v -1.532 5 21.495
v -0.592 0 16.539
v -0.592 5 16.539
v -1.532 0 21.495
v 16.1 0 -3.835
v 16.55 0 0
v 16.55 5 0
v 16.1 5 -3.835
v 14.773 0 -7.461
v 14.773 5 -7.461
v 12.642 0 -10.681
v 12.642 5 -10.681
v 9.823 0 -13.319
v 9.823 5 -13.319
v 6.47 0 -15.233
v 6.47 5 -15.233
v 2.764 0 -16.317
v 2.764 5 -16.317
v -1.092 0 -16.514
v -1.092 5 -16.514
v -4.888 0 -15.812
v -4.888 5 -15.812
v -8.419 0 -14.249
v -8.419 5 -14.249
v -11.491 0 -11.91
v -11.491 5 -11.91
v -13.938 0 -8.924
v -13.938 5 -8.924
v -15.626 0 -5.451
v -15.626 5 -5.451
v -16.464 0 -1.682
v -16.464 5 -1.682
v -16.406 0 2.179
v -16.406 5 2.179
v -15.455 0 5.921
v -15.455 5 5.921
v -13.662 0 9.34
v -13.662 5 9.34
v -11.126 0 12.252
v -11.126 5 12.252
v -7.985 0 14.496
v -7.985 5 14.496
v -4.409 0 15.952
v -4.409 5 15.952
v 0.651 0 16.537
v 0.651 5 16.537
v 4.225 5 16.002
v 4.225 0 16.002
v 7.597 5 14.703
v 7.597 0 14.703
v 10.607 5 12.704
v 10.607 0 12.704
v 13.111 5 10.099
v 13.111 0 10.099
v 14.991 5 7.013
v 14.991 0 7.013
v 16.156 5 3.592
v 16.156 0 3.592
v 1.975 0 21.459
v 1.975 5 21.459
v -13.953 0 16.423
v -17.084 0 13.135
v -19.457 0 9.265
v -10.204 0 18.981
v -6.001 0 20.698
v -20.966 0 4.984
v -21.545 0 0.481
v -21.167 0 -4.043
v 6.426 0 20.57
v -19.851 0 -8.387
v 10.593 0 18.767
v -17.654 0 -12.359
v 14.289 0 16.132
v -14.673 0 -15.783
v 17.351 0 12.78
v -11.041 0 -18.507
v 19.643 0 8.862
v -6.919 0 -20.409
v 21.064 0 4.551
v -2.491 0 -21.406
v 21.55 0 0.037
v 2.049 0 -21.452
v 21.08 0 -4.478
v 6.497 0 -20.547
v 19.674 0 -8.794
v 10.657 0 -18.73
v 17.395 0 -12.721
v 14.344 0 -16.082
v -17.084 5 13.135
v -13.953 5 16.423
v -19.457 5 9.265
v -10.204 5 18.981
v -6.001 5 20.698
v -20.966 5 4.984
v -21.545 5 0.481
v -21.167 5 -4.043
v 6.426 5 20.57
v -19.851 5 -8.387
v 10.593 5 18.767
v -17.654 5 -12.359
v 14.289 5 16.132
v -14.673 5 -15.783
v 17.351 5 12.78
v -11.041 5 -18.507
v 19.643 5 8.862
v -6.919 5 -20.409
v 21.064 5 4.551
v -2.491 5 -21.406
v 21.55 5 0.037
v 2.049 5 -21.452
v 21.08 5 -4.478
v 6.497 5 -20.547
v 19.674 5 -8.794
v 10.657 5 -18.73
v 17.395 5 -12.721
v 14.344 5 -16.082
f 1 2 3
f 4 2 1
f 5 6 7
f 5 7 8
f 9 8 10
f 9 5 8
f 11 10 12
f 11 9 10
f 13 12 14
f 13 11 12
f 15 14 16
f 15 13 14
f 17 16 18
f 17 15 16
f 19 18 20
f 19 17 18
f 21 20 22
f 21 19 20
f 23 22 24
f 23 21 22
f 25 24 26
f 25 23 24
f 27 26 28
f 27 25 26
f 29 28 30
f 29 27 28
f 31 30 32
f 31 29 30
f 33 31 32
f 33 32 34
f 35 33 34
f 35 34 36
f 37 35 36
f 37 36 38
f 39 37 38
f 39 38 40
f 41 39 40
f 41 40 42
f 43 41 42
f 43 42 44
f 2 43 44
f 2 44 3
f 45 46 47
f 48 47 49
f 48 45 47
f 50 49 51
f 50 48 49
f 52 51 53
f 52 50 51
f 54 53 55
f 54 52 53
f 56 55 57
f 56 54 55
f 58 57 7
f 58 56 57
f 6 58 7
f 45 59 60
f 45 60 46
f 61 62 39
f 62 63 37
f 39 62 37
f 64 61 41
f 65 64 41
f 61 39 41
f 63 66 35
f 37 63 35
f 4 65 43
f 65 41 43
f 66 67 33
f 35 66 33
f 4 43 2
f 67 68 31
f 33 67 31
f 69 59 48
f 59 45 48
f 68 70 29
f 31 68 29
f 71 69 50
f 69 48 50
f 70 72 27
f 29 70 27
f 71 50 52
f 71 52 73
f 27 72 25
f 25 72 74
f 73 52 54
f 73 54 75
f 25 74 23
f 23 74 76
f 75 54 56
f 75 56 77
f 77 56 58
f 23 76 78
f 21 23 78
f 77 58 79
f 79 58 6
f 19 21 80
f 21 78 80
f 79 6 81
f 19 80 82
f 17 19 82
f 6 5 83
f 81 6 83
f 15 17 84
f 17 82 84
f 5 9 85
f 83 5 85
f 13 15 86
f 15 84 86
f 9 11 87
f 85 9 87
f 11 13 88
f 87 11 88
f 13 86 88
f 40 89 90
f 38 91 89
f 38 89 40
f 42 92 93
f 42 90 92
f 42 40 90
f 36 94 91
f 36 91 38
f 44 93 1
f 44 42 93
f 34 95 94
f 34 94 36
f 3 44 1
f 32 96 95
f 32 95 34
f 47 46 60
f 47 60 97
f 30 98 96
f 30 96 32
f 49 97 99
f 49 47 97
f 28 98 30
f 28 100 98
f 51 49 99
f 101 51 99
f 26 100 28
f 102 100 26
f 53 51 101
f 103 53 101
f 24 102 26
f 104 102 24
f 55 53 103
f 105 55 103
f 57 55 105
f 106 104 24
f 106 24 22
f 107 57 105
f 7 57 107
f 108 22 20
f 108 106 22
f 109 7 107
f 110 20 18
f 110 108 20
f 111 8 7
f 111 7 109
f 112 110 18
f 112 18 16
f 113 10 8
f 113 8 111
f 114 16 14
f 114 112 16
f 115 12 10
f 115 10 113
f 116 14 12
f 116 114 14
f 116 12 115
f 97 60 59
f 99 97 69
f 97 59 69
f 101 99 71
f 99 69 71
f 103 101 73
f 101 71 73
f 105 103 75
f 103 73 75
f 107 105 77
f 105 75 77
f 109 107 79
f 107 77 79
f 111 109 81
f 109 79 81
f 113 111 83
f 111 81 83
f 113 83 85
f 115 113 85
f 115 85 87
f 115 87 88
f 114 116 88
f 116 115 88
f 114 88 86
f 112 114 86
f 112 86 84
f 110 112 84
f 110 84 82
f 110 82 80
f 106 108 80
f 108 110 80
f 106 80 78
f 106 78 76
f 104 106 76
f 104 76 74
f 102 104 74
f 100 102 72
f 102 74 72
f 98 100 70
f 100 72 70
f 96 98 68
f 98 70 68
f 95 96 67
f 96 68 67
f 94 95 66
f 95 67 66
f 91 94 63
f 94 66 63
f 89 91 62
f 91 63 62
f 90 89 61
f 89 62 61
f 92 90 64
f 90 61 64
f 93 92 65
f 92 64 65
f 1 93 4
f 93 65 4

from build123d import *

# Parameters (mm, degrees)
SKETCH1_R               = 21.55
SKETCH1_R_2             = 16.55
BOSS_EXTRUDE1_DEPTH     = 5
CUT_EXTRUDE2_DEPTH      = 15
CUT_EXTRUDE2_DEPTH_BACK = 12


with BuildPart() as part:
    # Sketch1 → Boss-Extrude1 (new body)
    with BuildSketch(Plane(origin=(0, 0, 0), x_dir=(1, 0, 0), z_dir=(0, 1, 0))):
        Circle(SKETCH1_R)
        Circle(SKETCH1_R_2, mode=Mode.SUBTRACT)
    extrude(amount=BOSS_EXTRUDE1_DEPTH)

    # Sketch3 → Cut-Extrude2 (cut, two sides)
    with BuildSketch(Plane(origin=(0, 0, 0), x_dir=(1, 0, 0), z_dir=(0, 1, 0))) as cut_extrude2_sk:
        Polygon((-1.758392575, -22.689237535), (2.305538937, -22.689237535), (0.504822735, -15.993131255), (0, -15.993131255), (-0.488859737, -15.993131255), align=None)
    extrude(amount=CUT_EXTRUDE2_DEPTH, mode=Mode.SUBTRACT)
    extrude(cut_extrude2_sk.sketch, amount=-CUT_EXTRUDE2_DEPTH_BACK, mode=Mode.SUBTRACT)


solid = part.part
